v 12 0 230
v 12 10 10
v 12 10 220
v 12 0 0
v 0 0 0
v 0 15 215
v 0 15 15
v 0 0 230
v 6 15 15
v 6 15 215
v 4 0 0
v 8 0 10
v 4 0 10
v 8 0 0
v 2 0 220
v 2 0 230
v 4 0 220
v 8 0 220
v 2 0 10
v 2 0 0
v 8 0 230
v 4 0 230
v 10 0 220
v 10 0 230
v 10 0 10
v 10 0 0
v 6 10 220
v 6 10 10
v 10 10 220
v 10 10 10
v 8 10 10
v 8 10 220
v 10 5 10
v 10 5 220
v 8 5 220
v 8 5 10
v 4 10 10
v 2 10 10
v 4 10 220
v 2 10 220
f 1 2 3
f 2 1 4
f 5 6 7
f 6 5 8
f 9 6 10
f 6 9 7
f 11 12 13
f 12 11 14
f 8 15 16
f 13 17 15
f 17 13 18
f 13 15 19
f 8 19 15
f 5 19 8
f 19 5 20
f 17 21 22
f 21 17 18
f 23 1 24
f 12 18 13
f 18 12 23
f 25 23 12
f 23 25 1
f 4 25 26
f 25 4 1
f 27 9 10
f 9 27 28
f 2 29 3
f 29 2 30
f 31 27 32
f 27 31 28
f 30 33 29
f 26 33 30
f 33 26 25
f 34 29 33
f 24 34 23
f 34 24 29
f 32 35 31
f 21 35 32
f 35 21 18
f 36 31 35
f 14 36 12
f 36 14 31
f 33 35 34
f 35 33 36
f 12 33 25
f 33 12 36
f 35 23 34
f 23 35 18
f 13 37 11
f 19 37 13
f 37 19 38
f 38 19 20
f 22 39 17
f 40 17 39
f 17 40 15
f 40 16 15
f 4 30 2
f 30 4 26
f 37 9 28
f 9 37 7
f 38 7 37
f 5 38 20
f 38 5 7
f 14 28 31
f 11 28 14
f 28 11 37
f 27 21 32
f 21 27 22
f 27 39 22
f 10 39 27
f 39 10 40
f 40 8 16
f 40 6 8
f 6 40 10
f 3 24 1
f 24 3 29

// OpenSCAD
// TBD parameterize this

// sizes 148 x 210 // Original
framelength = 210;


hide = 5;
nickdepth = 5;
base = 5;
nickfront = 2;
nick = 2;
nickback = 2;
slit = 10;
slitwidth = 2;

frontdepth = 6;

backdepth = nickfront+nick+nickback;

depth=frontdepth+backdepth;
height=hide+nickdepth+base;
extra = nickdepth+base;


fulllength = framelength + (2 * extra); 
// 45 degree angle of cut means we can just use the hide depth as the length offset.



// From one end to the other so that the diagonal cut gives us the right length

module frame() {
difference() {
    cube([depth,height,fulllength], center=false);
    // overlap at edge of picture
    translate([frontdepth,nickdepth+base,0]) cube([backdepth,hide,fulllength], center=false);
    // nick for fastening back of picture
    translate([frontdepth+nickfront,base,0]) cube([nick,nickdepth,fulllength], center=false);
 
    // fastening slits
    translate([frontdepth+nickfront,0,0]) cube([slitwidth,slit,slit]);
    translate([frontdepth+nickfront,0,fulllength-slit]) cube([slitwidth,slit,slit]);
    
        // fastening slits
    translate([nickfront,0,0]) cube([slitwidth,slit,slit]);
    translate([nickfront,0,fulllength-slit]) cube([slitwidth,slit,slit]);
    
    // diagonal cuts
    diagcut1();
    diagcut2();
  
   }
}
  
module diagcut1() {
translate([0,0,height])
rotate([0,90,0])
linear_extrude(depth)
polygon ([[height,height],[height,0],[0,height]]);
}



module diagcut2() {
translate([0,0,fulllength])
rotate([0,90,0])
linear_extrude(depth)
polygon ([[0,0],[height,height],[0,height]]);
}

module corner() {
   // Needed for wood fibre
   // fudge = 0.6;
   // Normal 
   fudge = 0.05;
   union() {
   difference() {
        cube([15,15,10]);
        translate([3,3,0]) cube([15,15,15]);
   }
   translate ([2,2,1]) cube([slit, slit, slitwidth-fudge]);
   translate ([2,2,7]) cube([slit, slit, slitwidth-fudge]);
    
}
}

frame();
// corner();
